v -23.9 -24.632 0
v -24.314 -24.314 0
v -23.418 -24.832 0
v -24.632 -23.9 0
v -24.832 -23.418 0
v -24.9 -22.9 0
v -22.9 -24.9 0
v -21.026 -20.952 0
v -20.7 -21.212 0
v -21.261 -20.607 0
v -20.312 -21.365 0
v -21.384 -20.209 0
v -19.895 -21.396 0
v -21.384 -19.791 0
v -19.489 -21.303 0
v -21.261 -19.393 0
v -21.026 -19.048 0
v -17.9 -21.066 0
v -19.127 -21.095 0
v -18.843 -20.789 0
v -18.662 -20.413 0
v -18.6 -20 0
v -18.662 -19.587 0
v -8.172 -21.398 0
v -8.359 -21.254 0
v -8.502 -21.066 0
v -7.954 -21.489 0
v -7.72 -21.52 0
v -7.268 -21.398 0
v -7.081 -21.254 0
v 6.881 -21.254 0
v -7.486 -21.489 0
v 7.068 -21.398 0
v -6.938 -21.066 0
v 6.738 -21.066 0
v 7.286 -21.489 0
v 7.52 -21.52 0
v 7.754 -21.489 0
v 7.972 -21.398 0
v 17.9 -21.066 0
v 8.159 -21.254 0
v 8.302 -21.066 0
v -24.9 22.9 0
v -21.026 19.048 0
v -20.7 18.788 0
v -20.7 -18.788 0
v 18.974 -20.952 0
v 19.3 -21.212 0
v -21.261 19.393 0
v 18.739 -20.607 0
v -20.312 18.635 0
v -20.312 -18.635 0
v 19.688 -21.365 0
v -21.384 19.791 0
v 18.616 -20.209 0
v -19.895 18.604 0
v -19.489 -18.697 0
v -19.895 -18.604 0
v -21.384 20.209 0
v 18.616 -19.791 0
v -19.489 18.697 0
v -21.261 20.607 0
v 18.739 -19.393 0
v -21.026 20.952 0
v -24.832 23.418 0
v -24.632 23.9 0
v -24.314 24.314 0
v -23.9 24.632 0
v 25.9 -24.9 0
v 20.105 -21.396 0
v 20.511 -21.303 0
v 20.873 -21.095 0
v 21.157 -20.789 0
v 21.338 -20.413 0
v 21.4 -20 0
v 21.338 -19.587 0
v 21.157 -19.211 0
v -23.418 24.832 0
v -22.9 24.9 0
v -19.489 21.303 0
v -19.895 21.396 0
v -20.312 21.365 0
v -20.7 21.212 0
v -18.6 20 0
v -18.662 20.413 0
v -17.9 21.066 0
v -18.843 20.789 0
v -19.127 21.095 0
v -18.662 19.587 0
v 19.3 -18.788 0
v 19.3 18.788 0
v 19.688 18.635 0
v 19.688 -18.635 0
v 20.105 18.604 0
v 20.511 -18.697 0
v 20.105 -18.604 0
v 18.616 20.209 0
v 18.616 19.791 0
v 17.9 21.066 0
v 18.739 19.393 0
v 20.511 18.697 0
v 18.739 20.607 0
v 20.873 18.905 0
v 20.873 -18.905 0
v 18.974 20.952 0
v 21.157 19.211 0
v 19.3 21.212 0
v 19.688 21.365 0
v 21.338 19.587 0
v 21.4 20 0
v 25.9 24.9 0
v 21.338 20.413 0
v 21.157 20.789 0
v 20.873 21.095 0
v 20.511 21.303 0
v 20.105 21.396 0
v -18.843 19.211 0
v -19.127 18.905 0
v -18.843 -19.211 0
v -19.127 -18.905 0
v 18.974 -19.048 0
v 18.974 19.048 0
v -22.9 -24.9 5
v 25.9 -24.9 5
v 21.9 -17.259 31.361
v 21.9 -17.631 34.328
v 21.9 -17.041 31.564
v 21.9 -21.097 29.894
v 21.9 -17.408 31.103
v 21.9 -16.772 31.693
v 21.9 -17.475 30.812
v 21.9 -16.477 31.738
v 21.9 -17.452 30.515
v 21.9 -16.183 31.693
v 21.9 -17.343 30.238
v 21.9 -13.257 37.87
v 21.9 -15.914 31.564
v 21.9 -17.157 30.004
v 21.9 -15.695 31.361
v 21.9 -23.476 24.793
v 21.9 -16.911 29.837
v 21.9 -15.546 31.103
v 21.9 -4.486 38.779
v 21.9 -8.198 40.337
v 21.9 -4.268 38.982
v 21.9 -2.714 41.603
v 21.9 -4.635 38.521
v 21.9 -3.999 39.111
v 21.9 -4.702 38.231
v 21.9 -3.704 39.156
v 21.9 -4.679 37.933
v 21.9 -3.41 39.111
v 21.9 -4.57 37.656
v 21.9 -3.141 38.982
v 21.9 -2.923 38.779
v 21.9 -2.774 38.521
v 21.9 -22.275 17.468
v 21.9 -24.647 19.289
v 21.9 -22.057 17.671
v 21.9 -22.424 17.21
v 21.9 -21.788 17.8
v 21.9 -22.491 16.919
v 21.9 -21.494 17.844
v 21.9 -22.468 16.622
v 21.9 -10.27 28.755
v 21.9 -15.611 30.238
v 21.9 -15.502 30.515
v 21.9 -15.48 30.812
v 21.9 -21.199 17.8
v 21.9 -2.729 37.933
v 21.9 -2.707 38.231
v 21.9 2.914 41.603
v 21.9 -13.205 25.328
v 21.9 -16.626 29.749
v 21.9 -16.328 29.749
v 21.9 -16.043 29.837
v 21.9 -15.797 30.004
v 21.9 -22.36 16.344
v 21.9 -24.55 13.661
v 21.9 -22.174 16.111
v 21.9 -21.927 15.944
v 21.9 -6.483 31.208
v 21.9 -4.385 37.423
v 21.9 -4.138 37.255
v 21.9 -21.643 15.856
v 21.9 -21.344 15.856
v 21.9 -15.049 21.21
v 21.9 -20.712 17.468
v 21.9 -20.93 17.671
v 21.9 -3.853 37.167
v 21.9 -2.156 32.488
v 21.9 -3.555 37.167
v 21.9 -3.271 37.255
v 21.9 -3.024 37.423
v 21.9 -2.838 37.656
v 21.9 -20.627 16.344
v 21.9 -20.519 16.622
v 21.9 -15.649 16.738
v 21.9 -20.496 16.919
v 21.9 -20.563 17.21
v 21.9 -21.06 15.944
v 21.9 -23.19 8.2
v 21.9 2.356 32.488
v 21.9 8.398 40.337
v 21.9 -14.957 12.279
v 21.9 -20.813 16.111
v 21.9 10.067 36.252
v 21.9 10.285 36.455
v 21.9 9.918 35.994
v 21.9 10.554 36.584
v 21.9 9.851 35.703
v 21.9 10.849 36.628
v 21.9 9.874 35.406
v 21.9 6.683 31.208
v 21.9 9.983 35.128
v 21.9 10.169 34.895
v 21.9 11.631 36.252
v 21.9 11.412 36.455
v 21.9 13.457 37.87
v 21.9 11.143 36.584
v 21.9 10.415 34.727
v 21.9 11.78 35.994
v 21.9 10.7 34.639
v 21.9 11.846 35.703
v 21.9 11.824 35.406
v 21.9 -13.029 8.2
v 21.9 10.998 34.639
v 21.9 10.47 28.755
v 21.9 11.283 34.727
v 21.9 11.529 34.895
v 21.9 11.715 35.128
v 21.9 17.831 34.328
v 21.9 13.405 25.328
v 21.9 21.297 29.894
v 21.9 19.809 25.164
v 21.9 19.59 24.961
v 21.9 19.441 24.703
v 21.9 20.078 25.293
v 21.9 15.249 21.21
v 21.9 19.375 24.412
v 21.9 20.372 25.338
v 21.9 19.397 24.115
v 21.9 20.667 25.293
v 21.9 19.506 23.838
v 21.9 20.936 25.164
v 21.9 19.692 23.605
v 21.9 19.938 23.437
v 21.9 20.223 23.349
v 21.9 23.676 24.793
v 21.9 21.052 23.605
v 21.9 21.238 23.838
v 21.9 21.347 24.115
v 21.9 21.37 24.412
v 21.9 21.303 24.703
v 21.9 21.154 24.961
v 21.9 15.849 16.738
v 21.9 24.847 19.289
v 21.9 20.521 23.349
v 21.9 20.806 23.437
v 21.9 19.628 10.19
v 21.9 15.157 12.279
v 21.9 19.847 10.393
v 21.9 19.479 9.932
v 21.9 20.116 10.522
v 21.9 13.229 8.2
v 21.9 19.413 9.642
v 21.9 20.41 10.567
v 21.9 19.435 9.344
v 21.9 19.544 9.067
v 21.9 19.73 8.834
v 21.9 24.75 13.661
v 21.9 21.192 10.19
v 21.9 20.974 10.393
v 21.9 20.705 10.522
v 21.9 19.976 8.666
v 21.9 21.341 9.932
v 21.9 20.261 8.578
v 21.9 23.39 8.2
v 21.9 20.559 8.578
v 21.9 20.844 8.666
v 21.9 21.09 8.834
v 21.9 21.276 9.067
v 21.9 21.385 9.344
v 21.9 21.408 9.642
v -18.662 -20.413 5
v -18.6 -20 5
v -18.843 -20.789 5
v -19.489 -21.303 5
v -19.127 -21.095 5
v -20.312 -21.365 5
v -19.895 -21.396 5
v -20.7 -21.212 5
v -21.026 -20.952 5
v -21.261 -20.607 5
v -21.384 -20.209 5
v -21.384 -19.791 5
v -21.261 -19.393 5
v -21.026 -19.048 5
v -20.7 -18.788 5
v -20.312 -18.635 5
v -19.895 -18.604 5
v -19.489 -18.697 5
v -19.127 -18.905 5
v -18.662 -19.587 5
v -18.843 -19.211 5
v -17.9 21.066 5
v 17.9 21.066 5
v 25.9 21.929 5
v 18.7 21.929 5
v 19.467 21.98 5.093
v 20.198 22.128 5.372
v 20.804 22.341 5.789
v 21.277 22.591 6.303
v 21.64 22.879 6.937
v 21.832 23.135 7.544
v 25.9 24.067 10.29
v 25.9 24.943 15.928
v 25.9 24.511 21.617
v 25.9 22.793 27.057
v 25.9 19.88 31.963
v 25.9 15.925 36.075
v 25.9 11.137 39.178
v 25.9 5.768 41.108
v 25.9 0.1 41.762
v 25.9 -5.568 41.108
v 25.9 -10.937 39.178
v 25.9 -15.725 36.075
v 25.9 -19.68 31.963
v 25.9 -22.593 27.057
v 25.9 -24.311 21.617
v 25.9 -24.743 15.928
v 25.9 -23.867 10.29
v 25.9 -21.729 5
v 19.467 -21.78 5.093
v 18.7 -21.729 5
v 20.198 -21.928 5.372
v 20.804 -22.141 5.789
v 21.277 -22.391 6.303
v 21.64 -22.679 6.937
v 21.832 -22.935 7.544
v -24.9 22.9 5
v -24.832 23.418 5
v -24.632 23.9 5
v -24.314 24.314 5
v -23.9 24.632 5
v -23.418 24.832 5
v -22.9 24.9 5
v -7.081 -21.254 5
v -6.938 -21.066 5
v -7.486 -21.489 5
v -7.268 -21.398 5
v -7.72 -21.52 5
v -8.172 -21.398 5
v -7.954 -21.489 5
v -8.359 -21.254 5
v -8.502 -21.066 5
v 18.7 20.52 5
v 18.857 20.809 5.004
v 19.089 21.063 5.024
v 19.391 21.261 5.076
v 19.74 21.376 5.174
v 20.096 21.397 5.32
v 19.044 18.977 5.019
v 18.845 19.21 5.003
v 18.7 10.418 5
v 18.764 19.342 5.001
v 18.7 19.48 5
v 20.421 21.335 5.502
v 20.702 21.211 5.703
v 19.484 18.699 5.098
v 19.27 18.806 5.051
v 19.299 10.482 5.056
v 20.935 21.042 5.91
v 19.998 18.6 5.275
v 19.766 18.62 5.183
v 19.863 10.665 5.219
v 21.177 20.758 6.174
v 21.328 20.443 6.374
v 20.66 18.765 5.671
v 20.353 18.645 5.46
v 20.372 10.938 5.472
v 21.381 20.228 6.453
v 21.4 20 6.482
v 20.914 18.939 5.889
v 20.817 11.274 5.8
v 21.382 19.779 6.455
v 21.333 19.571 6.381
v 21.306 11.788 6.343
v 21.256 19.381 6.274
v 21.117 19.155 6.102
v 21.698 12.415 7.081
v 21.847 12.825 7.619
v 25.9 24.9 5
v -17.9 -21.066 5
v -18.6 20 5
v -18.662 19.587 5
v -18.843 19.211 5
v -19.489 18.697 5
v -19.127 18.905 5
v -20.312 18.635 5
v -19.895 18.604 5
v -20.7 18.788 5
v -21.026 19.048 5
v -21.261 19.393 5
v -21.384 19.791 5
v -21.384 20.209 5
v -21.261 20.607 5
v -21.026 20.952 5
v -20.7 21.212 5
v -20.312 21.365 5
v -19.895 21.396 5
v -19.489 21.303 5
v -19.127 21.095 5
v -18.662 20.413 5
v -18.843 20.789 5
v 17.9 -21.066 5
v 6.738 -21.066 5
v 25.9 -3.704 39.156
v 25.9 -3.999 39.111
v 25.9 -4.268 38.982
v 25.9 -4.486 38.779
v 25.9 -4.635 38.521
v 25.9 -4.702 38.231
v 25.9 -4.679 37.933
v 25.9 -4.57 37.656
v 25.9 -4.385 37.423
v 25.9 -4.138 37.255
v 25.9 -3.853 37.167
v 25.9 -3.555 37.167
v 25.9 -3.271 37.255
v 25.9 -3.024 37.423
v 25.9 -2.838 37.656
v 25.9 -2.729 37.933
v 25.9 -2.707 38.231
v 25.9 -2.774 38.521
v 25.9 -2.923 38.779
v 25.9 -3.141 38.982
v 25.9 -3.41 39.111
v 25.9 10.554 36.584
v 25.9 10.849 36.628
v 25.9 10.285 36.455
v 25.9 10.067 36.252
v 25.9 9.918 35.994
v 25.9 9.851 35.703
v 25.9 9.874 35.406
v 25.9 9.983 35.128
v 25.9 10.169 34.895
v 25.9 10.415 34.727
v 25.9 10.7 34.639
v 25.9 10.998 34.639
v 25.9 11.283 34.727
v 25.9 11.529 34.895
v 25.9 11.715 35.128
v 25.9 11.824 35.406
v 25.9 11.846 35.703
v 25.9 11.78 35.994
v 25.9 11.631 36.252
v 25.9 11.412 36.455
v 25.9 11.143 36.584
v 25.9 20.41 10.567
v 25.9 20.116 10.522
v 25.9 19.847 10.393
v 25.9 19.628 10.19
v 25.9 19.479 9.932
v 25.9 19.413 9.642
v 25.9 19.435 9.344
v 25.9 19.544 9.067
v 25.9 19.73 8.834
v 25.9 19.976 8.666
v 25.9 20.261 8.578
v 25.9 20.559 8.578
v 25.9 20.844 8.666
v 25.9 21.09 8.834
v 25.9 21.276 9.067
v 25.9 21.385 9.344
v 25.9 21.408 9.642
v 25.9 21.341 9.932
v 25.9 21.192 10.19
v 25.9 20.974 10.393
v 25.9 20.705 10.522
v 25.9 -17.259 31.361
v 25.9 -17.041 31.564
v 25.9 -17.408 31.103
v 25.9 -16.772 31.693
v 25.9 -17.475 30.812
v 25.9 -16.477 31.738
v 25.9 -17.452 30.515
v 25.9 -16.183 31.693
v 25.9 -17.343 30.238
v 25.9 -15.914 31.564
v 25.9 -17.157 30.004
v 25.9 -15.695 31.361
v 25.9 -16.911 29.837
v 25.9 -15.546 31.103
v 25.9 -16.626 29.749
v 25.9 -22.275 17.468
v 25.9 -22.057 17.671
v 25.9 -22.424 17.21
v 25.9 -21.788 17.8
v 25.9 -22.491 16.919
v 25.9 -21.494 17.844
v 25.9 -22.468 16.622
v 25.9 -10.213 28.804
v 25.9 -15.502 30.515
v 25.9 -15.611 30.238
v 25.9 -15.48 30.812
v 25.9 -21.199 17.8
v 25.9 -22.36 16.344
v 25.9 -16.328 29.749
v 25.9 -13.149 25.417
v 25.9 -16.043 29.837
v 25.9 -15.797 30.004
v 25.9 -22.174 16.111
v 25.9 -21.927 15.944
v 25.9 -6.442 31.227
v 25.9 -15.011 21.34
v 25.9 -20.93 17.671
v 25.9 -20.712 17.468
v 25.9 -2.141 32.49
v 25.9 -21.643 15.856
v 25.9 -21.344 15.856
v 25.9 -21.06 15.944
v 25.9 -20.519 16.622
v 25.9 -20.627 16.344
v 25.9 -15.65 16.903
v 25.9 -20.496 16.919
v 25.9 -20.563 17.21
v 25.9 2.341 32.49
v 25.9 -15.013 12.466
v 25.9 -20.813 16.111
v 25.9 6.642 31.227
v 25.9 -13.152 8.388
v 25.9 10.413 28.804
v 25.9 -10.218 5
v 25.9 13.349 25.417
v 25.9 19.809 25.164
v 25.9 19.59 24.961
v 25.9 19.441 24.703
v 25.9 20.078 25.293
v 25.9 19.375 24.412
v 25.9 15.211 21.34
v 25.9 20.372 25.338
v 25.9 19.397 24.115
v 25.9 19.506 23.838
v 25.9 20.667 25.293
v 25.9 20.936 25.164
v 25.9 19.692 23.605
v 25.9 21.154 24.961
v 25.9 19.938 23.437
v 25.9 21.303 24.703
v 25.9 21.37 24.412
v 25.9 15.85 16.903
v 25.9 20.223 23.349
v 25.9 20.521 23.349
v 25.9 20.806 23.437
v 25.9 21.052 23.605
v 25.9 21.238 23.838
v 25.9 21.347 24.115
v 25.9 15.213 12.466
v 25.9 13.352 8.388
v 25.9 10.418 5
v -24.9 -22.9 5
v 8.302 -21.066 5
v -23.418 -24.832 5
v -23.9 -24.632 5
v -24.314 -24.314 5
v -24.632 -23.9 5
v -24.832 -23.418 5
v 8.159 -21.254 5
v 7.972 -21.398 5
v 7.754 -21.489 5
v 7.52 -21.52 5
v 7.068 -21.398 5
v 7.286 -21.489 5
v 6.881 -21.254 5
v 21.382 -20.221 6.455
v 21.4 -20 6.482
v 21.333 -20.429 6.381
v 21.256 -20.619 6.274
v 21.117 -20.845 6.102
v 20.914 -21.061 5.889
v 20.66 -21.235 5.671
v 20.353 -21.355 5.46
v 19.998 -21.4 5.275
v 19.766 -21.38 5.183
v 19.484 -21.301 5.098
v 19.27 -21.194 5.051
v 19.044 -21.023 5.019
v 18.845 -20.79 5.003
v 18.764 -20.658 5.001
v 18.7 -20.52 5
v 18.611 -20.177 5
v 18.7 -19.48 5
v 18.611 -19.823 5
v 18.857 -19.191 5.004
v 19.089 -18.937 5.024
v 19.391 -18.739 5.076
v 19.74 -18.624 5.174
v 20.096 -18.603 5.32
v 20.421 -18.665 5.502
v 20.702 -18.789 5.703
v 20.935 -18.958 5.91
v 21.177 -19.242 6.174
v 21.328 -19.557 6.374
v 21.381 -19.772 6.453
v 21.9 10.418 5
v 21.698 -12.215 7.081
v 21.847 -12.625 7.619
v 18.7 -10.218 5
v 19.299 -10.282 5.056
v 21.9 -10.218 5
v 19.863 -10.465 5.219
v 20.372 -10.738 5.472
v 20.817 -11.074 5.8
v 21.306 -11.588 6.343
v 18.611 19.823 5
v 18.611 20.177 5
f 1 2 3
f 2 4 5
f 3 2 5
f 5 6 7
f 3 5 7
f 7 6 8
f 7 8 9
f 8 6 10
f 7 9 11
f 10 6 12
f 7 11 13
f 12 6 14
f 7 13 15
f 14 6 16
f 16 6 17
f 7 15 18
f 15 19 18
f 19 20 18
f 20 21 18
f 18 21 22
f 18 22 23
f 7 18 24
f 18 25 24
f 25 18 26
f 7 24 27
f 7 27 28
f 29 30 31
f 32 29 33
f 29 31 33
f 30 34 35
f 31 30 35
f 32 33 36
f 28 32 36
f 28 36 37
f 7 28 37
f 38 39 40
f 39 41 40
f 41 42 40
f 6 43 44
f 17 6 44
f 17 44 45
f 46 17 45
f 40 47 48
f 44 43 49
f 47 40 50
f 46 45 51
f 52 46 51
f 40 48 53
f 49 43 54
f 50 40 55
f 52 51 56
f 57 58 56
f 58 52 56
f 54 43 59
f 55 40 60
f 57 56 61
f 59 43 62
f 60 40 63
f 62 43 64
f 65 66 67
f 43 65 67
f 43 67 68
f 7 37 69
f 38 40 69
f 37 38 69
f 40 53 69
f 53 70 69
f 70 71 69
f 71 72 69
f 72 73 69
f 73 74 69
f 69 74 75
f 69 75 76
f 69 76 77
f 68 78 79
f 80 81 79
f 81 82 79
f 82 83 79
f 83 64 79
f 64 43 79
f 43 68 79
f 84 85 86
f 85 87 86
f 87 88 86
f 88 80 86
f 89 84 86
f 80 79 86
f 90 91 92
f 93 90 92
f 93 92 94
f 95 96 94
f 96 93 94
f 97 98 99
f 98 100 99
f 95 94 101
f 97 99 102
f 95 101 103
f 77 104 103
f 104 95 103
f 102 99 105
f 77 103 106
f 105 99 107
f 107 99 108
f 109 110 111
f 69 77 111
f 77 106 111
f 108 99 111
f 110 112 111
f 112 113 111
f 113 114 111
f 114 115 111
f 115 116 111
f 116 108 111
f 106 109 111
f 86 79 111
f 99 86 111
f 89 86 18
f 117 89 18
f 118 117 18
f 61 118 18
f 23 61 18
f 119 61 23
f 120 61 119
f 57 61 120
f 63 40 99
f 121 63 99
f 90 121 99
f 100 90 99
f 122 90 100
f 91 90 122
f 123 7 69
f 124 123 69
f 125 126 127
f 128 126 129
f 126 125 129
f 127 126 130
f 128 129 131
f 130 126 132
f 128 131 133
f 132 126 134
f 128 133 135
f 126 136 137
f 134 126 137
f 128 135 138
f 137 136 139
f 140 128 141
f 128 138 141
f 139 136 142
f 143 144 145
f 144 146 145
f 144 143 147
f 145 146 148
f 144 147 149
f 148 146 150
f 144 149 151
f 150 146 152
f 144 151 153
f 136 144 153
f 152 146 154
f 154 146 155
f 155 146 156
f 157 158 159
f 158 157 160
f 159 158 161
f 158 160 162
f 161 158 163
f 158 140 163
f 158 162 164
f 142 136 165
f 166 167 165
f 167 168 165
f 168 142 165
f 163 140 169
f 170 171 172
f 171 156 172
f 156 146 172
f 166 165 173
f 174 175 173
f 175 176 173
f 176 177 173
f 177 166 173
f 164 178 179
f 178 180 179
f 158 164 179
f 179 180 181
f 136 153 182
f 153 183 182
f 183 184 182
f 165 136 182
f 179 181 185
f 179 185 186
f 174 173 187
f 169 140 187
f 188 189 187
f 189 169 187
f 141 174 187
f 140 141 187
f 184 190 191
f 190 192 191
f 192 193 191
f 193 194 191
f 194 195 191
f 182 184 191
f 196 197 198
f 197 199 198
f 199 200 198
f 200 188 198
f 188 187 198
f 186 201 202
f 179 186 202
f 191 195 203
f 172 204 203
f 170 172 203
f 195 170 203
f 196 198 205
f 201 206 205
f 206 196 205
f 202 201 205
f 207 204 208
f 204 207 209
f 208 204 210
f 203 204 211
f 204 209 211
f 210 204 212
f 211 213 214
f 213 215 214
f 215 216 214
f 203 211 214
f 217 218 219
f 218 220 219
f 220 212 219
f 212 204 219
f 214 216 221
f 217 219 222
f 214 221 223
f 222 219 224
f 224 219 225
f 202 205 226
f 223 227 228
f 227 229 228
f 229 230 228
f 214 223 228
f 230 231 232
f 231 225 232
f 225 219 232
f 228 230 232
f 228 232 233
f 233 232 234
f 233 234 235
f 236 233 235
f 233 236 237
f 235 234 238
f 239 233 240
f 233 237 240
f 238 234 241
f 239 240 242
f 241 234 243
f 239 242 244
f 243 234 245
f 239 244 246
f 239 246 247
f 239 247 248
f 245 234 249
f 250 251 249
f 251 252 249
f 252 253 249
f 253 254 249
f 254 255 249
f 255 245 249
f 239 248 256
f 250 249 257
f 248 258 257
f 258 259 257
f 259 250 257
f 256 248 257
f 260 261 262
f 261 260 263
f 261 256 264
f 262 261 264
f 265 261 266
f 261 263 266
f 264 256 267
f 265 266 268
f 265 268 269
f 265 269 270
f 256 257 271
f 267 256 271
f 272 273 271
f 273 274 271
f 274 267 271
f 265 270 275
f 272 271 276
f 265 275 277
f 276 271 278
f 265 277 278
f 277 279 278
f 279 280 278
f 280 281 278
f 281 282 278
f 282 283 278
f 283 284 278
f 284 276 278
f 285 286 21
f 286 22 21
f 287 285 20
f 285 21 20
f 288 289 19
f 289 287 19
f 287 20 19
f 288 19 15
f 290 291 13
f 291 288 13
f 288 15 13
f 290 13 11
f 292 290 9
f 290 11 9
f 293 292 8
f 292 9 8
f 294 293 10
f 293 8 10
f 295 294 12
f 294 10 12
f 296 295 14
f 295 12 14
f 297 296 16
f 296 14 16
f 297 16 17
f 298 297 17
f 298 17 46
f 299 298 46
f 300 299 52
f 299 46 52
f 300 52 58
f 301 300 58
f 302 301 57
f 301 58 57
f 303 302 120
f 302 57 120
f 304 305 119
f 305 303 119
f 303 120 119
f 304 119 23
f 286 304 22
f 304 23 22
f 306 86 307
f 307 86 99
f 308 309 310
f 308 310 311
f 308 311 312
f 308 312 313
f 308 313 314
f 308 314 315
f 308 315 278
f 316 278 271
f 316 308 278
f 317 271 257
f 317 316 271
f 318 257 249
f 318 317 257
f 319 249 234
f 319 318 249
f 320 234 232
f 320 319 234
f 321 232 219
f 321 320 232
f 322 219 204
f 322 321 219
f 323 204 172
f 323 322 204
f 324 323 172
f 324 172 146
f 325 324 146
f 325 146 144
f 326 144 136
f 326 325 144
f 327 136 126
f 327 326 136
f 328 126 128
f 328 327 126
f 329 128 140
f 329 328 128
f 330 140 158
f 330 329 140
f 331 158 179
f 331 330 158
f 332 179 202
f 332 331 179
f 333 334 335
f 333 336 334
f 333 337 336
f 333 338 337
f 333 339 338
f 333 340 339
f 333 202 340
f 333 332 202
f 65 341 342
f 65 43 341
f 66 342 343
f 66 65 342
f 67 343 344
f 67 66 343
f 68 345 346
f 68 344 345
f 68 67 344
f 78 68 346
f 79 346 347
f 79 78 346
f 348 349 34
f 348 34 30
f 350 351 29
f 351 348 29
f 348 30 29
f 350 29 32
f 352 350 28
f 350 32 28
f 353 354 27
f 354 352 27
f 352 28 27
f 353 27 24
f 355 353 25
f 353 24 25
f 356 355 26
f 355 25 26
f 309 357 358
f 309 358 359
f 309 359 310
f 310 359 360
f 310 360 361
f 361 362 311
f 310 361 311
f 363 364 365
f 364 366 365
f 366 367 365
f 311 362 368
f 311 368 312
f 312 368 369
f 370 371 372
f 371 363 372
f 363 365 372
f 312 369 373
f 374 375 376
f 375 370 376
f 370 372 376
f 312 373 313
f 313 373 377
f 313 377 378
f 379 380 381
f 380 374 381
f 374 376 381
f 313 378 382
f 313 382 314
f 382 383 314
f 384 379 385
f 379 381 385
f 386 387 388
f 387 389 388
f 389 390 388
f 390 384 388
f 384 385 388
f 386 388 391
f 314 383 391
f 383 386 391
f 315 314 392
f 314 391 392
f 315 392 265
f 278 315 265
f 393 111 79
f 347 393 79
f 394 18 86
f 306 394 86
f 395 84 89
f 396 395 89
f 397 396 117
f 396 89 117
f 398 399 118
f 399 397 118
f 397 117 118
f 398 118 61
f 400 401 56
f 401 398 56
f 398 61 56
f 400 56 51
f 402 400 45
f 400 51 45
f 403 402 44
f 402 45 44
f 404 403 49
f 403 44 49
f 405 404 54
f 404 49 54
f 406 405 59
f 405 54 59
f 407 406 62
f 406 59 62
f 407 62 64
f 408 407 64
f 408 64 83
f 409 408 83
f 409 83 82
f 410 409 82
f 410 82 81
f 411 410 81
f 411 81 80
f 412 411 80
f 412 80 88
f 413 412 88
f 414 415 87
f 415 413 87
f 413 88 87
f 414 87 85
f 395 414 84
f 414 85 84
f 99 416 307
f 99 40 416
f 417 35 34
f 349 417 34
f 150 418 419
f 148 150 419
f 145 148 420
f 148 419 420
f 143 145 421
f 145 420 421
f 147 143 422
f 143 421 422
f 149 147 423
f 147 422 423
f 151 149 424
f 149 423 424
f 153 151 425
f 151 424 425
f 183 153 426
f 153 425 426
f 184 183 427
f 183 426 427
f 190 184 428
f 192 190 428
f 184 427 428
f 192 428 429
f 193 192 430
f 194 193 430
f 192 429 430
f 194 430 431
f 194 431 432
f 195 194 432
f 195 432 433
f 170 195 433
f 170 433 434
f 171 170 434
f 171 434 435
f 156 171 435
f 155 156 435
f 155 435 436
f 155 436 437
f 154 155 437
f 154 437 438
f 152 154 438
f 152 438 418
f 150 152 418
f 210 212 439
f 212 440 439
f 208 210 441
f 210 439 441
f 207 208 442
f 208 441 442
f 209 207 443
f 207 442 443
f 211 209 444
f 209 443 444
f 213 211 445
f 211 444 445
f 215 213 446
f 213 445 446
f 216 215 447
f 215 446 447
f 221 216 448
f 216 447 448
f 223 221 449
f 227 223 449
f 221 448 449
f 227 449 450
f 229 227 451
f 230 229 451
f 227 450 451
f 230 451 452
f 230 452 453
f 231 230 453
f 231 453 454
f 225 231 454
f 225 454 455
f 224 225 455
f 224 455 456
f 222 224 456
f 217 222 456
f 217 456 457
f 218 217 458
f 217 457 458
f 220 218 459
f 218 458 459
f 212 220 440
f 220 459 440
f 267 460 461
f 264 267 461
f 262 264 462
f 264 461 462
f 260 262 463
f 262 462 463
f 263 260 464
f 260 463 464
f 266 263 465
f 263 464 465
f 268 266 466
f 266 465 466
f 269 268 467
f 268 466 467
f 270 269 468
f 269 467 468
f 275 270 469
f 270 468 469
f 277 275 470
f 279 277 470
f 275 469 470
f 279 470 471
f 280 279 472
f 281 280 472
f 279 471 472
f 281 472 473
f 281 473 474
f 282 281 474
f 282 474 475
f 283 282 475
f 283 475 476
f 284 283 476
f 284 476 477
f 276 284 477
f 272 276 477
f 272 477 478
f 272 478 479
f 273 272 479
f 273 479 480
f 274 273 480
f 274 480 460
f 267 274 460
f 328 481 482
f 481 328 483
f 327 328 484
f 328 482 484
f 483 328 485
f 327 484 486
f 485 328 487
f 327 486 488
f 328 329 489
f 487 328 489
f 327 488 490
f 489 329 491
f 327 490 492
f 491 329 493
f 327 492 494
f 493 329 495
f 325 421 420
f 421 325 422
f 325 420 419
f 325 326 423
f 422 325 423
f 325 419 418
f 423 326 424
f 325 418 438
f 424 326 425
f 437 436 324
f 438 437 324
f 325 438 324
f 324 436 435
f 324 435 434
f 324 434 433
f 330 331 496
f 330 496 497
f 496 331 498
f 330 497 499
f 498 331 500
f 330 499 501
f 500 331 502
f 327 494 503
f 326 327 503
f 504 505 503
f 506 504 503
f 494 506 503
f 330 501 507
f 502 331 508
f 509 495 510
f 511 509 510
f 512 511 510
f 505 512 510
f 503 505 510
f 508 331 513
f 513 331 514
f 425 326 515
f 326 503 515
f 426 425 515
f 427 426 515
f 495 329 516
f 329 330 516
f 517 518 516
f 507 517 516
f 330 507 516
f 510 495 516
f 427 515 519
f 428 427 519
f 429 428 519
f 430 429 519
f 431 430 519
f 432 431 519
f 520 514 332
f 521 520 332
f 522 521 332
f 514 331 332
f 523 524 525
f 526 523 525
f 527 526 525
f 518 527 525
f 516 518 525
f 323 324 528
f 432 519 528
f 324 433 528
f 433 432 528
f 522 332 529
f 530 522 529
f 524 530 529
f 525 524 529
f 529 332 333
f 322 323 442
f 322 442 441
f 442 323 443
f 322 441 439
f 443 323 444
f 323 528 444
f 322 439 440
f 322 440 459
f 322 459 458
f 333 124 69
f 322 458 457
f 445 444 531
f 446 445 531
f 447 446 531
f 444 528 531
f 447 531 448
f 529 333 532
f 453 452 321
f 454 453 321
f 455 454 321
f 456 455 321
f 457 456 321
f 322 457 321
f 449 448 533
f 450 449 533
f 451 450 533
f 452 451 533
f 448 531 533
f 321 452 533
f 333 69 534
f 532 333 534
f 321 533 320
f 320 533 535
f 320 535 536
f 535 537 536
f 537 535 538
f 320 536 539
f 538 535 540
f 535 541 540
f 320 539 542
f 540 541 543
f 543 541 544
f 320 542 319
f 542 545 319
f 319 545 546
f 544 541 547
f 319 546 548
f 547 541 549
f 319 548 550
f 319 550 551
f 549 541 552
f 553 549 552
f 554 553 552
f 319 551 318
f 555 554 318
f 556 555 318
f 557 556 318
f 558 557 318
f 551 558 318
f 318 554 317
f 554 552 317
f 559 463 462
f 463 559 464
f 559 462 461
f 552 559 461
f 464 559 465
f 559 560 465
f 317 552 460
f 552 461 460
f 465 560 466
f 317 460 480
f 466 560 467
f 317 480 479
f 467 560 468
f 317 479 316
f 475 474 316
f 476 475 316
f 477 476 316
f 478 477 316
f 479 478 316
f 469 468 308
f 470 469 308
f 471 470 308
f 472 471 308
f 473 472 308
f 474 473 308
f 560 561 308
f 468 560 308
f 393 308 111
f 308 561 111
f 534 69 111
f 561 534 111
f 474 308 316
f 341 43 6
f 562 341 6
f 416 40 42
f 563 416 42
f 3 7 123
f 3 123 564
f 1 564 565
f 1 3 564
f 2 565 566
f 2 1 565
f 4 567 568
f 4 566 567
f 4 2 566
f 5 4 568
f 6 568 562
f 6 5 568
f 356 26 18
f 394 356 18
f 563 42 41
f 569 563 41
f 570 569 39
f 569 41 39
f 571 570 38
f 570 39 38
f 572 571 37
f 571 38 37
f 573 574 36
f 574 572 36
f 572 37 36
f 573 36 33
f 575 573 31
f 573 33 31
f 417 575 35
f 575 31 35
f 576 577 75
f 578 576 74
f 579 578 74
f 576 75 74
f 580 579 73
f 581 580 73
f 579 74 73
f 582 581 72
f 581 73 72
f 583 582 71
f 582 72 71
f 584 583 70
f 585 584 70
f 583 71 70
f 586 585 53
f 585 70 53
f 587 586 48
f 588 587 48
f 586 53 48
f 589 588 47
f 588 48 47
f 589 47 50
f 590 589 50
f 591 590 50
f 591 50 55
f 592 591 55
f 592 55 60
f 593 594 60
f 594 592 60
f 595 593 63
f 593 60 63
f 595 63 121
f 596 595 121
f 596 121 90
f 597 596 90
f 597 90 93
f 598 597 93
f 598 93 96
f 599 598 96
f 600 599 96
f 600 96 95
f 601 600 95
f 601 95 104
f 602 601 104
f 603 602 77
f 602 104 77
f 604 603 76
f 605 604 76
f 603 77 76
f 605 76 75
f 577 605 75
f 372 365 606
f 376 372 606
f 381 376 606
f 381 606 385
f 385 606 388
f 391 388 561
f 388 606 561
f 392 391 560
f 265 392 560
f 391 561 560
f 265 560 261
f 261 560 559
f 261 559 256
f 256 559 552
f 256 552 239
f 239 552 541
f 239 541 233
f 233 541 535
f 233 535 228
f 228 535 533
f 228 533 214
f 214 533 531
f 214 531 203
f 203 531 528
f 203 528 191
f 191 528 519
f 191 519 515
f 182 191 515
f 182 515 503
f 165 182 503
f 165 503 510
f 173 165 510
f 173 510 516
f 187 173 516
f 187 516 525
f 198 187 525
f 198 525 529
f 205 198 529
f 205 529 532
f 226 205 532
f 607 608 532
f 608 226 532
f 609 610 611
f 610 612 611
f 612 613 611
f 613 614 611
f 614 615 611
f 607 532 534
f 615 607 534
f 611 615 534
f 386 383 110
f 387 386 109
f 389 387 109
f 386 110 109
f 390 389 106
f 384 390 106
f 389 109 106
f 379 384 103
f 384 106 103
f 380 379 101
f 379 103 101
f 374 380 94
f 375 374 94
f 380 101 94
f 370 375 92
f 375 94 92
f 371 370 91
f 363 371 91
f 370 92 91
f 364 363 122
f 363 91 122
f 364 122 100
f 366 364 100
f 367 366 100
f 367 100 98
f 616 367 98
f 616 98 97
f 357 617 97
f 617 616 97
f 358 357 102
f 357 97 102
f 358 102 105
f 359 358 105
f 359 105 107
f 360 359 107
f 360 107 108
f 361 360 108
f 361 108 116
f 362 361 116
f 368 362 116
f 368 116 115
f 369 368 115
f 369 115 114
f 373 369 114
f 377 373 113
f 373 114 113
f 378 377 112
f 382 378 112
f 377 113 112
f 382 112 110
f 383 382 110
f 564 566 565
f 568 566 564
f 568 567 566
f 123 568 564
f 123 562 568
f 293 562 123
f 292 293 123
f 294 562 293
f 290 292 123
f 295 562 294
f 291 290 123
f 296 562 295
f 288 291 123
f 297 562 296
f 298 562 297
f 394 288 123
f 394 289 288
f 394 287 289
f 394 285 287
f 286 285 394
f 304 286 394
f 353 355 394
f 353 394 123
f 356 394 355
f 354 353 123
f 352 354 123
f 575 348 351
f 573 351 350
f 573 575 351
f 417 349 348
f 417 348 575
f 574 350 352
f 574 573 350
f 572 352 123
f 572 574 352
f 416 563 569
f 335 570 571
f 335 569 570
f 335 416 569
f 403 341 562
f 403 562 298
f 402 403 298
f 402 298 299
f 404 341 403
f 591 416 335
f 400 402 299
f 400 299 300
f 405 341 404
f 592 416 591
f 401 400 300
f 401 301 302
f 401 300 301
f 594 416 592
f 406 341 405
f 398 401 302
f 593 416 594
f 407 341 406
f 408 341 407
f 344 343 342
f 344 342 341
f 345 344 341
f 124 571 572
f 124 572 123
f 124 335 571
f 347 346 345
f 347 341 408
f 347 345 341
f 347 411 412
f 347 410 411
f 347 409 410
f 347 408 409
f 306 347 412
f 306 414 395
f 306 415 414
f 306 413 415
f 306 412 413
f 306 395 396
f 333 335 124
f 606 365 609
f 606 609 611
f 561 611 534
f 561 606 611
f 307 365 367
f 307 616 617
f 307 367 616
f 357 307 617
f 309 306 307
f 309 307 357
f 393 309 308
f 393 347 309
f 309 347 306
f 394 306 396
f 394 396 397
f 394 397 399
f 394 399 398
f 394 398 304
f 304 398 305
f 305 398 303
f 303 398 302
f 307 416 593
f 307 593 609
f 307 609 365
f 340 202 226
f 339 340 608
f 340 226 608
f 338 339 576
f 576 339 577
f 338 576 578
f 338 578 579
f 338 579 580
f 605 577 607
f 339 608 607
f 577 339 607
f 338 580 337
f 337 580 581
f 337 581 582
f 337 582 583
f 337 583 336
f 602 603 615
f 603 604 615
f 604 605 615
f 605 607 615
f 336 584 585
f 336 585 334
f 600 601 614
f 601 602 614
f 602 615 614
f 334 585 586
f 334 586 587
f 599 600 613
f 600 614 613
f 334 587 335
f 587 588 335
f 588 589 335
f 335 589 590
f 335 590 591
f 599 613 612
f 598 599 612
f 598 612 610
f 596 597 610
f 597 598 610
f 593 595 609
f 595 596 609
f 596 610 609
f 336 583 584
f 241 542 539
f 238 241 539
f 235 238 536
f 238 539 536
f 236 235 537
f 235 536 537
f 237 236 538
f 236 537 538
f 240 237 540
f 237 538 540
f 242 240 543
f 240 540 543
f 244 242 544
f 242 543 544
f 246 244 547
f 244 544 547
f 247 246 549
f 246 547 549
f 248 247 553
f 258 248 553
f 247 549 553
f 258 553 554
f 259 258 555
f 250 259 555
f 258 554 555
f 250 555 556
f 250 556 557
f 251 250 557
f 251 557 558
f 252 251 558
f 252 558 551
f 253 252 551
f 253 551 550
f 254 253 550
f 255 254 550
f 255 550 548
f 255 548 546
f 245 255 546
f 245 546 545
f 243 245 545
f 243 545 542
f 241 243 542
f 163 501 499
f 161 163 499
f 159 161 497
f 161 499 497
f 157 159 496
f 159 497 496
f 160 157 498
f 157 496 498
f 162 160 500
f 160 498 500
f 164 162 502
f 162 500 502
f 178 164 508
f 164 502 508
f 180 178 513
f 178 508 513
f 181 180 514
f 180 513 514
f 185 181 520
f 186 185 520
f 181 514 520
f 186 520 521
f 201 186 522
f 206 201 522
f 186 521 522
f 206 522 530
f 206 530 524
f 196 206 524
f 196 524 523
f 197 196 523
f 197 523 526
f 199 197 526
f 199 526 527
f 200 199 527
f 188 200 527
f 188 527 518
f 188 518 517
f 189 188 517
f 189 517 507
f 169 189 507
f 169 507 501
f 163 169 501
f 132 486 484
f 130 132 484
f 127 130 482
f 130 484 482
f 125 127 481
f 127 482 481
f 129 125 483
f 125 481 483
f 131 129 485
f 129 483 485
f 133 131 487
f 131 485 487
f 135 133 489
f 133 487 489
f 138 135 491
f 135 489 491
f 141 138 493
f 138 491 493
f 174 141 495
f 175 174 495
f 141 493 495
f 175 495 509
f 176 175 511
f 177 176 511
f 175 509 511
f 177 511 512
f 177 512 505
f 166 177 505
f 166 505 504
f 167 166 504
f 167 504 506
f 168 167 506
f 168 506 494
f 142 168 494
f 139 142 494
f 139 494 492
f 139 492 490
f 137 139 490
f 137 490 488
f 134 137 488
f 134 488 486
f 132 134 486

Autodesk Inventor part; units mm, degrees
ref_plane "YZ Plane" through (0, 0, 0) normal (1, 0, 0) x (0, 1, 0)
ref_plane "XZ Plane" through (0, 0, 0) normal (0, 1, 0) x (-1, 0, 0)
ref_plane "XY Plane" through (0, 0, 0) normal (0, 0, 1) x (1, 0, 0)
ref_plane "Arbeitsebene1" through (0, 0, 0) normal (0, 0, 1) x (1, 0, 0)
sketch "Skizze1" plane through (0, 0, 0) normal (0, 0, 1) x (1, 0, 0)
  arc A0 (13.4381, 5.6873) -> (13.3881, 5.2) centre (15.7881, 5.2) ccw construction
  line L0 (13.4381, 5.6873) -> (13.4381, 7.6) construction
  line L1 (13.4381, 7.6) -> (15.7881, 7.6) construction
  arc A1 (18.1881, 5.2) -> (15.7881, 7.6) centre (15.7881, 5.2) ccw projected
  line L2 (18.1881, 5.2) -> (18.1881, -5.2) construction
  arc A2 (15.7881, -7.6) -> (18.1881, -5.2) centre (15.7881, -5.2) ccw projected
  line L3 (15.7881, -7.6) -> (13.4381, -7.6) construction
  line L4 (13.4381, -7.6) -> (13.4381, -5.6873) construction
  arc A3 (13.3881, -5.2) -> (13.4381, -5.6873) centre (15.7881, -5.2) ccw construction
  line L5 (13.3881, -5.2) -> (13.3881, 5.2) construction
  arc A4 (14.5, 9) -> (11.5, 6) centre (14.5, 6) ccw construction
  line L6 (11.5, -6) -> (11.5, 6) construction
  arc A5 (11.5, -6) -> (14.5, -9) centre (14.5, -6) ccw construction
  line L7 (14.9, -9) -> (14.5, -9) construction
  arc A6 (17.9, -12) -> (14.9, -9) centre (14.9, -12) ccw projected
  line L8 (17.9, -12) -> (17.9, -21.066) projected
  line L9 (6.7383, -21.066) -> (-6.9383, -21.066) projected
  line L10 (-17.9, -21.066) -> (-17.9, 21.066) projected
  line L11 (-17.9, 21.066) -> (17.9, 21.066) projected
  line L12 (17.9, 21.066) -> (17.9, 12) projected
  arc A7 (14.9, 9) -> (17.9, 12) centre (14.9, 12) ccw projected
  line L13 (14.5, 9) -> (14.9, 9) construction
  circle A8 centre (-20, 20) radius 1.6 construction
  circle A9 centre (20, -20) radius 1.6 construction
  circle A10 centre (-20, -20) radius 1.6 construction
  circle A11 centre (20, 20) radius 1.6 construction
  arc A12 (-22.9, 24.9) -> (-24.9, 22.9) centre (-22.9, 22.9) ccw projected
  line L14 (-24.9, 22.9) -> (-24.9, -22.9) projected
  arc A13 (-24.9, -22.9) -> (-22.9, -24.9) centre (-22.9, -22.9) ccw projected
  line L15 (-22.9, -24.9) -> (22.9, -24.9) projected
  arc A14 (22.9, -24.9) -> (24.9, -22.9) centre (22.9, -22.9) ccw projected
  line L16 (24.9, -22.9) -> (24.9, 22.9) projected
  arc A15 (24.9, 22.9) -> (22.9, 24.9) centre (22.9, 22.9) ccw projected
  line L17 (22.9, 24.9) -> (-22.9, 24.9) projected
  arc A16 (6.7383, -21.066) -> (8.3017, -21.066) centre (7.52, -20.62) ccw projected
  arc A17 (-8.5017, -21.066) -> (-6.9383, -21.066) centre (-7.72, -20.62) ccw projected
  line L18 (-8.5017, -21.066) -> (-17.9, -21.066) projected
  line L19 (17.9, -21.066) -> (8.3017, -21.066) projected
  line L20 (17.9, -12) -> (17.9, 12)
  circle A18 centre (-20, 20) radius 1.4
  line L21 (-20, 20) -> (20, 20) construction
  line L22 (20, 20) -> (20, -20) construction
  line L23 (20, -20) -> (-20, -20) construction
  line L24 (-20, -20) -> (-20, 20) construction
  circle A19 centre (20, -20) radius 1.4
  circle A20 centre (20, 20) radius 1.4
  circle A21 centre (-20, -20) radius 1.4
  line L25 (25.9, -32.5) -> (25.9, 32.5) projected
  line L26 (22.9, -24.9) -> (25.9, -24.9)
  line L27 (22.9, 24.9) -> (25.9, 24.9)
  point P0 (0, 0)
  dimension "d7" = 2.8
  dimension "d8" = 40
  dimension "d9" = 40
  dimension "d10" = 2.8
  dimension "d11" = 2.8
  dimension "d12" = 2.8
extrude "Extrusion1" add sketch "Skizze1" along normal blind 5
sketch "Sketch6" plane through (25.9, -24.9, 0) normal (1, 0, 0) x (0, 0, -1)
  circle A0 centre (-16.9, 25) radius 22.5 projected
  circle A1 centre (-16.9, 25) radius 15.75 projected
  line L0 (-5, 0) -> (-5, 49.8) projected
  line L1 (-5, 14.6824) -> (-5, 5.9045)
  line L2 (-5, 44.0955) -> (-5, 35.3176)
  arc A2 (-5, 46.8294) -> (-5, 3.1706) centre (-16.9, 25) ccw
  line L3 (-5, 46.8294) -> (-5, 35.3176)
  line L4 (-5, 14.6824) -> (-5, 3.1706)
  point P0 (0, 24.9)
extrude "Extrusion3" add sketch "Sketch6" against normal blind 4 contours L0 A1 A0 | A0 L0 A2 picked at (-36.9413, 23.2431)
sketch "Sketch7" plane through (21.9, -24.9, 0) normal (-1, 0, 0) x (0, 0, 1)
  circle A0 centre (2.9774, 8.4941) radius 0.25 projected
  circle A1 centre (16.8445, 3.4065) radius 0.25 projected
  circle A2 centre (30.7375, 8.4227) radius 0.25 projected
  circle A3 centre (38.1558, 21.1956) radius 0.25 projected
  circle A4 centre (35.6283, 35.7487) radius 0.25 projected
  circle A5 centre (24.3376, 45.2723) radius 0.25 projected
  circle A6 centre (9.5668, 45.3103) radius 0.25 projected
  circle A7 centre (-1.7728, 35.8449) radius 0.25 projected
  circle A8 centre (-4.3751, 21.305) radius 0.25 projected
  line L0 (-2.665, 15.2234) -> (2.0334, 16.9335) projected
  line L1 (2.0334, 16.9335) -> (0.3233, 21.632) projected
  line L2 (0.3233, 21.632) -> (-4.3751, 19.9219) projected
  line L3 (-4.3751, 19.9219) -> (-2.665, 15.2234) projected
  line L4 (1.8587, 9.1214) -> (5.6889, 12.3353) projected
  line L5 (5.6889, 12.3353) -> (2.4749, 16.1656) projected
  line L6 (2.4749, 16.1656) -> (-1.3553, 12.9516) projected
  line L7 (-1.3553, 12.9516) -> (1.8587, 9.1214) projected
  line L8 (8.1966, 4.9346) -> (10.6966, 9.2647) projected
  line L9 (10.6966, 9.2647) -> (6.3664, 11.7647) projected
  line L10 (6.3664, 11.7647) -> (3.8664, 7.4346) projected
  line L11 (3.8664, 7.4346) -> (8.1966, 4.9346) projected
  line L12 (15.5842, 3.1679) -> (16.4525, 8.0919) projected
  line L13 (16.4525, 8.0919) -> (11.5284, 8.9602) projected
  line L14 (11.5284, 8.9602) -> (10.6602, 4.0361) projected
  line L15 (10.6602, 4.0361) -> (15.5842, 3.1679) projected
  line L16 (23.1306, 4.0345) -> (22.2623, 8.9586) projected
  line L17 (22.2623, 8.9586) -> (17.3383, 8.0903) projected
  line L18 (17.3383, 8.0903) -> (18.2066, 3.1663) projected
  line L19 (18.2066, 3.1663) -> (23.1306, 4.0345) projected
  line L20 (29.9255, 7.4299) -> (27.4255, 11.76) projected
  line L21 (27.4255, 11.76) -> (23.0953, 9.26) projected
  line L22 (23.0953, 9.26) -> (25.5953, 4.9299) projected
  line L23 (25.5953, 4.9299) -> (29.9255, 7.4299) projected
  line L24 (35.1493, 12.9445) -> (31.319, 16.1584) projected
  line L25 (31.319, 16.1584) -> (28.1051, 12.3282) projected
  line L26 (28.1051, 12.3282) -> (31.9353, 9.1142) projected
  line L27 (31.9353, 9.1142) -> (35.1493, 12.9445) projected
  line L28 (38.1719, 19.9131) -> (33.4735, 21.6232) projected
  line L29 (33.4735, 21.6232) -> (31.7634, 16.9247) projected
  line L30 (31.7634, 16.9247) -> (36.4618, 15.2146) projected
  line L31 (36.4618, 15.2146) -> (38.1719, 19.9131) projected
  line L32 (38.6289, 27.4953) -> (33.6289, 27.4953) projected
  line L33 (33.6289, 27.4953) -> (33.6289, 22.4953) projected
  line L34 (33.6289, 22.4953) -> (38.6289, 22.4953) projected
  line L35 (38.6289, 22.4953) -> (38.6289, 27.4953) projected
  line L36 (36.465, 34.7766) -> (31.7666, 33.0665) projected
  line L37 (31.7666, 33.0665) -> (33.4767, 28.368) projected
  line L38 (33.4767, 28.368) -> (38.1751, 30.0781) projected
  line L39 (38.1751, 30.0781) -> (36.465, 34.7766) projected
  line L40 (31.9413, 40.8786) -> (28.1111, 37.6647) projected
  line L41 (28.1111, 37.6647) -> (31.3251, 33.8344) projected
  line L42 (31.3251, 33.8344) -> (35.1553, 37.0484) projected
  line L43 (35.1553, 37.0484) -> (31.9413, 40.8786) projected
  line L44 (25.6034, 45.0654) -> (23.1034, 40.7353) projected
  line L45 (23.1034, 40.7353) -> (27.4336, 38.2353) projected
  line L46 (27.4336, 38.2353) -> (29.9336, 42.5654) projected
  line L47 (29.9336, 42.5654) -> (25.6034, 45.0654) projected
  line L48 (18.2158, 46.8321) -> (17.3475, 41.9081) projected
  line L49 (17.3475, 41.9081) -> (22.2716, 41.0398) projected
  line L50 (22.2716, 41.0398) -> (23.1398, 45.9639) projected
  line L51 (23.1398, 45.9639) -> (18.2158, 46.8321) projected
  line L52 (10.6694, 45.9655) -> (11.5377, 41.0414) projected
  line L53 (11.5377, 41.0414) -> (16.4617, 41.9097) projected
  line L54 (16.4617, 41.9097) -> (15.5934, 46.8337) projected
  line L55 (15.5934, 46.8337) -> (10.6694, 45.9655) projected
  line L56 (3.8745, 42.5701) -> (6.3745, 38.24) projected
  line L57 (6.3745, 38.24) -> (10.7047, 40.74) projected
  line L58 (10.7047, 40.74) -> (8.2047, 45.0701) projected
  line L59 (8.2047, 45.0701) -> (3.8745, 42.5701) projected
  line L60 (-1.3493, 37.0555) -> (2.481, 33.8416) projected
  line L61 (2.481, 33.8416) -> (5.6949, 37.6718) projected
  line L62 (5.6949, 37.6718) -> (1.8647, 40.8858) projected
  line L63 (1.8647, 40.8858) -> (-1.3493, 37.0555) projected
  line L64 (-4.3719, 30.0869) -> (0.3265, 28.3768) projected
  line L65 (0.3265, 28.3768) -> (2.0366, 33.0753) projected
  line L66 (2.0366, 33.0753) -> (-2.6618, 34.7854) projected
  line L67 (-2.6618, 34.7854) -> (-4.3719, 30.0869) projected
  line L68 (-4.8289, 22.5047) -> (0.1711, 22.5047) projected
  line L69 (0.1711, 22.5047) -> (0.1711, 27.5047) projected
  line L70 (0.1711, 27.5047) -> (-4.8289, 27.5047) projected
  line L71 (-4.8289, 27.5047) -> (-4.8289, 22.5047) projected
  circle A9 centre (16.9, 25) radius 15.75 projected
  circle A10 centre (16.9, 25) radius 22.5 projected
  point P0 (0, 24.9)
hole "Hole1" at (21.9, 20.4103, 9.5668) at (21.9, 20.3723, 24.3376) at (21.9, 10.8487, 35.6283) at (21.9, -3.7044, 38.1558) at (21.9, -16.4773, 30.7375) at (21.9, -21.4935, 16.8445) direction (1, 0, 0) diameter 2 end through all
fillet "Fillet2" radius 3.2 2 edges at (21.9, 16.1735, 5) (21.9, -15.9735, 5)
properties part number "30_Cube_LED_Array_v0"
